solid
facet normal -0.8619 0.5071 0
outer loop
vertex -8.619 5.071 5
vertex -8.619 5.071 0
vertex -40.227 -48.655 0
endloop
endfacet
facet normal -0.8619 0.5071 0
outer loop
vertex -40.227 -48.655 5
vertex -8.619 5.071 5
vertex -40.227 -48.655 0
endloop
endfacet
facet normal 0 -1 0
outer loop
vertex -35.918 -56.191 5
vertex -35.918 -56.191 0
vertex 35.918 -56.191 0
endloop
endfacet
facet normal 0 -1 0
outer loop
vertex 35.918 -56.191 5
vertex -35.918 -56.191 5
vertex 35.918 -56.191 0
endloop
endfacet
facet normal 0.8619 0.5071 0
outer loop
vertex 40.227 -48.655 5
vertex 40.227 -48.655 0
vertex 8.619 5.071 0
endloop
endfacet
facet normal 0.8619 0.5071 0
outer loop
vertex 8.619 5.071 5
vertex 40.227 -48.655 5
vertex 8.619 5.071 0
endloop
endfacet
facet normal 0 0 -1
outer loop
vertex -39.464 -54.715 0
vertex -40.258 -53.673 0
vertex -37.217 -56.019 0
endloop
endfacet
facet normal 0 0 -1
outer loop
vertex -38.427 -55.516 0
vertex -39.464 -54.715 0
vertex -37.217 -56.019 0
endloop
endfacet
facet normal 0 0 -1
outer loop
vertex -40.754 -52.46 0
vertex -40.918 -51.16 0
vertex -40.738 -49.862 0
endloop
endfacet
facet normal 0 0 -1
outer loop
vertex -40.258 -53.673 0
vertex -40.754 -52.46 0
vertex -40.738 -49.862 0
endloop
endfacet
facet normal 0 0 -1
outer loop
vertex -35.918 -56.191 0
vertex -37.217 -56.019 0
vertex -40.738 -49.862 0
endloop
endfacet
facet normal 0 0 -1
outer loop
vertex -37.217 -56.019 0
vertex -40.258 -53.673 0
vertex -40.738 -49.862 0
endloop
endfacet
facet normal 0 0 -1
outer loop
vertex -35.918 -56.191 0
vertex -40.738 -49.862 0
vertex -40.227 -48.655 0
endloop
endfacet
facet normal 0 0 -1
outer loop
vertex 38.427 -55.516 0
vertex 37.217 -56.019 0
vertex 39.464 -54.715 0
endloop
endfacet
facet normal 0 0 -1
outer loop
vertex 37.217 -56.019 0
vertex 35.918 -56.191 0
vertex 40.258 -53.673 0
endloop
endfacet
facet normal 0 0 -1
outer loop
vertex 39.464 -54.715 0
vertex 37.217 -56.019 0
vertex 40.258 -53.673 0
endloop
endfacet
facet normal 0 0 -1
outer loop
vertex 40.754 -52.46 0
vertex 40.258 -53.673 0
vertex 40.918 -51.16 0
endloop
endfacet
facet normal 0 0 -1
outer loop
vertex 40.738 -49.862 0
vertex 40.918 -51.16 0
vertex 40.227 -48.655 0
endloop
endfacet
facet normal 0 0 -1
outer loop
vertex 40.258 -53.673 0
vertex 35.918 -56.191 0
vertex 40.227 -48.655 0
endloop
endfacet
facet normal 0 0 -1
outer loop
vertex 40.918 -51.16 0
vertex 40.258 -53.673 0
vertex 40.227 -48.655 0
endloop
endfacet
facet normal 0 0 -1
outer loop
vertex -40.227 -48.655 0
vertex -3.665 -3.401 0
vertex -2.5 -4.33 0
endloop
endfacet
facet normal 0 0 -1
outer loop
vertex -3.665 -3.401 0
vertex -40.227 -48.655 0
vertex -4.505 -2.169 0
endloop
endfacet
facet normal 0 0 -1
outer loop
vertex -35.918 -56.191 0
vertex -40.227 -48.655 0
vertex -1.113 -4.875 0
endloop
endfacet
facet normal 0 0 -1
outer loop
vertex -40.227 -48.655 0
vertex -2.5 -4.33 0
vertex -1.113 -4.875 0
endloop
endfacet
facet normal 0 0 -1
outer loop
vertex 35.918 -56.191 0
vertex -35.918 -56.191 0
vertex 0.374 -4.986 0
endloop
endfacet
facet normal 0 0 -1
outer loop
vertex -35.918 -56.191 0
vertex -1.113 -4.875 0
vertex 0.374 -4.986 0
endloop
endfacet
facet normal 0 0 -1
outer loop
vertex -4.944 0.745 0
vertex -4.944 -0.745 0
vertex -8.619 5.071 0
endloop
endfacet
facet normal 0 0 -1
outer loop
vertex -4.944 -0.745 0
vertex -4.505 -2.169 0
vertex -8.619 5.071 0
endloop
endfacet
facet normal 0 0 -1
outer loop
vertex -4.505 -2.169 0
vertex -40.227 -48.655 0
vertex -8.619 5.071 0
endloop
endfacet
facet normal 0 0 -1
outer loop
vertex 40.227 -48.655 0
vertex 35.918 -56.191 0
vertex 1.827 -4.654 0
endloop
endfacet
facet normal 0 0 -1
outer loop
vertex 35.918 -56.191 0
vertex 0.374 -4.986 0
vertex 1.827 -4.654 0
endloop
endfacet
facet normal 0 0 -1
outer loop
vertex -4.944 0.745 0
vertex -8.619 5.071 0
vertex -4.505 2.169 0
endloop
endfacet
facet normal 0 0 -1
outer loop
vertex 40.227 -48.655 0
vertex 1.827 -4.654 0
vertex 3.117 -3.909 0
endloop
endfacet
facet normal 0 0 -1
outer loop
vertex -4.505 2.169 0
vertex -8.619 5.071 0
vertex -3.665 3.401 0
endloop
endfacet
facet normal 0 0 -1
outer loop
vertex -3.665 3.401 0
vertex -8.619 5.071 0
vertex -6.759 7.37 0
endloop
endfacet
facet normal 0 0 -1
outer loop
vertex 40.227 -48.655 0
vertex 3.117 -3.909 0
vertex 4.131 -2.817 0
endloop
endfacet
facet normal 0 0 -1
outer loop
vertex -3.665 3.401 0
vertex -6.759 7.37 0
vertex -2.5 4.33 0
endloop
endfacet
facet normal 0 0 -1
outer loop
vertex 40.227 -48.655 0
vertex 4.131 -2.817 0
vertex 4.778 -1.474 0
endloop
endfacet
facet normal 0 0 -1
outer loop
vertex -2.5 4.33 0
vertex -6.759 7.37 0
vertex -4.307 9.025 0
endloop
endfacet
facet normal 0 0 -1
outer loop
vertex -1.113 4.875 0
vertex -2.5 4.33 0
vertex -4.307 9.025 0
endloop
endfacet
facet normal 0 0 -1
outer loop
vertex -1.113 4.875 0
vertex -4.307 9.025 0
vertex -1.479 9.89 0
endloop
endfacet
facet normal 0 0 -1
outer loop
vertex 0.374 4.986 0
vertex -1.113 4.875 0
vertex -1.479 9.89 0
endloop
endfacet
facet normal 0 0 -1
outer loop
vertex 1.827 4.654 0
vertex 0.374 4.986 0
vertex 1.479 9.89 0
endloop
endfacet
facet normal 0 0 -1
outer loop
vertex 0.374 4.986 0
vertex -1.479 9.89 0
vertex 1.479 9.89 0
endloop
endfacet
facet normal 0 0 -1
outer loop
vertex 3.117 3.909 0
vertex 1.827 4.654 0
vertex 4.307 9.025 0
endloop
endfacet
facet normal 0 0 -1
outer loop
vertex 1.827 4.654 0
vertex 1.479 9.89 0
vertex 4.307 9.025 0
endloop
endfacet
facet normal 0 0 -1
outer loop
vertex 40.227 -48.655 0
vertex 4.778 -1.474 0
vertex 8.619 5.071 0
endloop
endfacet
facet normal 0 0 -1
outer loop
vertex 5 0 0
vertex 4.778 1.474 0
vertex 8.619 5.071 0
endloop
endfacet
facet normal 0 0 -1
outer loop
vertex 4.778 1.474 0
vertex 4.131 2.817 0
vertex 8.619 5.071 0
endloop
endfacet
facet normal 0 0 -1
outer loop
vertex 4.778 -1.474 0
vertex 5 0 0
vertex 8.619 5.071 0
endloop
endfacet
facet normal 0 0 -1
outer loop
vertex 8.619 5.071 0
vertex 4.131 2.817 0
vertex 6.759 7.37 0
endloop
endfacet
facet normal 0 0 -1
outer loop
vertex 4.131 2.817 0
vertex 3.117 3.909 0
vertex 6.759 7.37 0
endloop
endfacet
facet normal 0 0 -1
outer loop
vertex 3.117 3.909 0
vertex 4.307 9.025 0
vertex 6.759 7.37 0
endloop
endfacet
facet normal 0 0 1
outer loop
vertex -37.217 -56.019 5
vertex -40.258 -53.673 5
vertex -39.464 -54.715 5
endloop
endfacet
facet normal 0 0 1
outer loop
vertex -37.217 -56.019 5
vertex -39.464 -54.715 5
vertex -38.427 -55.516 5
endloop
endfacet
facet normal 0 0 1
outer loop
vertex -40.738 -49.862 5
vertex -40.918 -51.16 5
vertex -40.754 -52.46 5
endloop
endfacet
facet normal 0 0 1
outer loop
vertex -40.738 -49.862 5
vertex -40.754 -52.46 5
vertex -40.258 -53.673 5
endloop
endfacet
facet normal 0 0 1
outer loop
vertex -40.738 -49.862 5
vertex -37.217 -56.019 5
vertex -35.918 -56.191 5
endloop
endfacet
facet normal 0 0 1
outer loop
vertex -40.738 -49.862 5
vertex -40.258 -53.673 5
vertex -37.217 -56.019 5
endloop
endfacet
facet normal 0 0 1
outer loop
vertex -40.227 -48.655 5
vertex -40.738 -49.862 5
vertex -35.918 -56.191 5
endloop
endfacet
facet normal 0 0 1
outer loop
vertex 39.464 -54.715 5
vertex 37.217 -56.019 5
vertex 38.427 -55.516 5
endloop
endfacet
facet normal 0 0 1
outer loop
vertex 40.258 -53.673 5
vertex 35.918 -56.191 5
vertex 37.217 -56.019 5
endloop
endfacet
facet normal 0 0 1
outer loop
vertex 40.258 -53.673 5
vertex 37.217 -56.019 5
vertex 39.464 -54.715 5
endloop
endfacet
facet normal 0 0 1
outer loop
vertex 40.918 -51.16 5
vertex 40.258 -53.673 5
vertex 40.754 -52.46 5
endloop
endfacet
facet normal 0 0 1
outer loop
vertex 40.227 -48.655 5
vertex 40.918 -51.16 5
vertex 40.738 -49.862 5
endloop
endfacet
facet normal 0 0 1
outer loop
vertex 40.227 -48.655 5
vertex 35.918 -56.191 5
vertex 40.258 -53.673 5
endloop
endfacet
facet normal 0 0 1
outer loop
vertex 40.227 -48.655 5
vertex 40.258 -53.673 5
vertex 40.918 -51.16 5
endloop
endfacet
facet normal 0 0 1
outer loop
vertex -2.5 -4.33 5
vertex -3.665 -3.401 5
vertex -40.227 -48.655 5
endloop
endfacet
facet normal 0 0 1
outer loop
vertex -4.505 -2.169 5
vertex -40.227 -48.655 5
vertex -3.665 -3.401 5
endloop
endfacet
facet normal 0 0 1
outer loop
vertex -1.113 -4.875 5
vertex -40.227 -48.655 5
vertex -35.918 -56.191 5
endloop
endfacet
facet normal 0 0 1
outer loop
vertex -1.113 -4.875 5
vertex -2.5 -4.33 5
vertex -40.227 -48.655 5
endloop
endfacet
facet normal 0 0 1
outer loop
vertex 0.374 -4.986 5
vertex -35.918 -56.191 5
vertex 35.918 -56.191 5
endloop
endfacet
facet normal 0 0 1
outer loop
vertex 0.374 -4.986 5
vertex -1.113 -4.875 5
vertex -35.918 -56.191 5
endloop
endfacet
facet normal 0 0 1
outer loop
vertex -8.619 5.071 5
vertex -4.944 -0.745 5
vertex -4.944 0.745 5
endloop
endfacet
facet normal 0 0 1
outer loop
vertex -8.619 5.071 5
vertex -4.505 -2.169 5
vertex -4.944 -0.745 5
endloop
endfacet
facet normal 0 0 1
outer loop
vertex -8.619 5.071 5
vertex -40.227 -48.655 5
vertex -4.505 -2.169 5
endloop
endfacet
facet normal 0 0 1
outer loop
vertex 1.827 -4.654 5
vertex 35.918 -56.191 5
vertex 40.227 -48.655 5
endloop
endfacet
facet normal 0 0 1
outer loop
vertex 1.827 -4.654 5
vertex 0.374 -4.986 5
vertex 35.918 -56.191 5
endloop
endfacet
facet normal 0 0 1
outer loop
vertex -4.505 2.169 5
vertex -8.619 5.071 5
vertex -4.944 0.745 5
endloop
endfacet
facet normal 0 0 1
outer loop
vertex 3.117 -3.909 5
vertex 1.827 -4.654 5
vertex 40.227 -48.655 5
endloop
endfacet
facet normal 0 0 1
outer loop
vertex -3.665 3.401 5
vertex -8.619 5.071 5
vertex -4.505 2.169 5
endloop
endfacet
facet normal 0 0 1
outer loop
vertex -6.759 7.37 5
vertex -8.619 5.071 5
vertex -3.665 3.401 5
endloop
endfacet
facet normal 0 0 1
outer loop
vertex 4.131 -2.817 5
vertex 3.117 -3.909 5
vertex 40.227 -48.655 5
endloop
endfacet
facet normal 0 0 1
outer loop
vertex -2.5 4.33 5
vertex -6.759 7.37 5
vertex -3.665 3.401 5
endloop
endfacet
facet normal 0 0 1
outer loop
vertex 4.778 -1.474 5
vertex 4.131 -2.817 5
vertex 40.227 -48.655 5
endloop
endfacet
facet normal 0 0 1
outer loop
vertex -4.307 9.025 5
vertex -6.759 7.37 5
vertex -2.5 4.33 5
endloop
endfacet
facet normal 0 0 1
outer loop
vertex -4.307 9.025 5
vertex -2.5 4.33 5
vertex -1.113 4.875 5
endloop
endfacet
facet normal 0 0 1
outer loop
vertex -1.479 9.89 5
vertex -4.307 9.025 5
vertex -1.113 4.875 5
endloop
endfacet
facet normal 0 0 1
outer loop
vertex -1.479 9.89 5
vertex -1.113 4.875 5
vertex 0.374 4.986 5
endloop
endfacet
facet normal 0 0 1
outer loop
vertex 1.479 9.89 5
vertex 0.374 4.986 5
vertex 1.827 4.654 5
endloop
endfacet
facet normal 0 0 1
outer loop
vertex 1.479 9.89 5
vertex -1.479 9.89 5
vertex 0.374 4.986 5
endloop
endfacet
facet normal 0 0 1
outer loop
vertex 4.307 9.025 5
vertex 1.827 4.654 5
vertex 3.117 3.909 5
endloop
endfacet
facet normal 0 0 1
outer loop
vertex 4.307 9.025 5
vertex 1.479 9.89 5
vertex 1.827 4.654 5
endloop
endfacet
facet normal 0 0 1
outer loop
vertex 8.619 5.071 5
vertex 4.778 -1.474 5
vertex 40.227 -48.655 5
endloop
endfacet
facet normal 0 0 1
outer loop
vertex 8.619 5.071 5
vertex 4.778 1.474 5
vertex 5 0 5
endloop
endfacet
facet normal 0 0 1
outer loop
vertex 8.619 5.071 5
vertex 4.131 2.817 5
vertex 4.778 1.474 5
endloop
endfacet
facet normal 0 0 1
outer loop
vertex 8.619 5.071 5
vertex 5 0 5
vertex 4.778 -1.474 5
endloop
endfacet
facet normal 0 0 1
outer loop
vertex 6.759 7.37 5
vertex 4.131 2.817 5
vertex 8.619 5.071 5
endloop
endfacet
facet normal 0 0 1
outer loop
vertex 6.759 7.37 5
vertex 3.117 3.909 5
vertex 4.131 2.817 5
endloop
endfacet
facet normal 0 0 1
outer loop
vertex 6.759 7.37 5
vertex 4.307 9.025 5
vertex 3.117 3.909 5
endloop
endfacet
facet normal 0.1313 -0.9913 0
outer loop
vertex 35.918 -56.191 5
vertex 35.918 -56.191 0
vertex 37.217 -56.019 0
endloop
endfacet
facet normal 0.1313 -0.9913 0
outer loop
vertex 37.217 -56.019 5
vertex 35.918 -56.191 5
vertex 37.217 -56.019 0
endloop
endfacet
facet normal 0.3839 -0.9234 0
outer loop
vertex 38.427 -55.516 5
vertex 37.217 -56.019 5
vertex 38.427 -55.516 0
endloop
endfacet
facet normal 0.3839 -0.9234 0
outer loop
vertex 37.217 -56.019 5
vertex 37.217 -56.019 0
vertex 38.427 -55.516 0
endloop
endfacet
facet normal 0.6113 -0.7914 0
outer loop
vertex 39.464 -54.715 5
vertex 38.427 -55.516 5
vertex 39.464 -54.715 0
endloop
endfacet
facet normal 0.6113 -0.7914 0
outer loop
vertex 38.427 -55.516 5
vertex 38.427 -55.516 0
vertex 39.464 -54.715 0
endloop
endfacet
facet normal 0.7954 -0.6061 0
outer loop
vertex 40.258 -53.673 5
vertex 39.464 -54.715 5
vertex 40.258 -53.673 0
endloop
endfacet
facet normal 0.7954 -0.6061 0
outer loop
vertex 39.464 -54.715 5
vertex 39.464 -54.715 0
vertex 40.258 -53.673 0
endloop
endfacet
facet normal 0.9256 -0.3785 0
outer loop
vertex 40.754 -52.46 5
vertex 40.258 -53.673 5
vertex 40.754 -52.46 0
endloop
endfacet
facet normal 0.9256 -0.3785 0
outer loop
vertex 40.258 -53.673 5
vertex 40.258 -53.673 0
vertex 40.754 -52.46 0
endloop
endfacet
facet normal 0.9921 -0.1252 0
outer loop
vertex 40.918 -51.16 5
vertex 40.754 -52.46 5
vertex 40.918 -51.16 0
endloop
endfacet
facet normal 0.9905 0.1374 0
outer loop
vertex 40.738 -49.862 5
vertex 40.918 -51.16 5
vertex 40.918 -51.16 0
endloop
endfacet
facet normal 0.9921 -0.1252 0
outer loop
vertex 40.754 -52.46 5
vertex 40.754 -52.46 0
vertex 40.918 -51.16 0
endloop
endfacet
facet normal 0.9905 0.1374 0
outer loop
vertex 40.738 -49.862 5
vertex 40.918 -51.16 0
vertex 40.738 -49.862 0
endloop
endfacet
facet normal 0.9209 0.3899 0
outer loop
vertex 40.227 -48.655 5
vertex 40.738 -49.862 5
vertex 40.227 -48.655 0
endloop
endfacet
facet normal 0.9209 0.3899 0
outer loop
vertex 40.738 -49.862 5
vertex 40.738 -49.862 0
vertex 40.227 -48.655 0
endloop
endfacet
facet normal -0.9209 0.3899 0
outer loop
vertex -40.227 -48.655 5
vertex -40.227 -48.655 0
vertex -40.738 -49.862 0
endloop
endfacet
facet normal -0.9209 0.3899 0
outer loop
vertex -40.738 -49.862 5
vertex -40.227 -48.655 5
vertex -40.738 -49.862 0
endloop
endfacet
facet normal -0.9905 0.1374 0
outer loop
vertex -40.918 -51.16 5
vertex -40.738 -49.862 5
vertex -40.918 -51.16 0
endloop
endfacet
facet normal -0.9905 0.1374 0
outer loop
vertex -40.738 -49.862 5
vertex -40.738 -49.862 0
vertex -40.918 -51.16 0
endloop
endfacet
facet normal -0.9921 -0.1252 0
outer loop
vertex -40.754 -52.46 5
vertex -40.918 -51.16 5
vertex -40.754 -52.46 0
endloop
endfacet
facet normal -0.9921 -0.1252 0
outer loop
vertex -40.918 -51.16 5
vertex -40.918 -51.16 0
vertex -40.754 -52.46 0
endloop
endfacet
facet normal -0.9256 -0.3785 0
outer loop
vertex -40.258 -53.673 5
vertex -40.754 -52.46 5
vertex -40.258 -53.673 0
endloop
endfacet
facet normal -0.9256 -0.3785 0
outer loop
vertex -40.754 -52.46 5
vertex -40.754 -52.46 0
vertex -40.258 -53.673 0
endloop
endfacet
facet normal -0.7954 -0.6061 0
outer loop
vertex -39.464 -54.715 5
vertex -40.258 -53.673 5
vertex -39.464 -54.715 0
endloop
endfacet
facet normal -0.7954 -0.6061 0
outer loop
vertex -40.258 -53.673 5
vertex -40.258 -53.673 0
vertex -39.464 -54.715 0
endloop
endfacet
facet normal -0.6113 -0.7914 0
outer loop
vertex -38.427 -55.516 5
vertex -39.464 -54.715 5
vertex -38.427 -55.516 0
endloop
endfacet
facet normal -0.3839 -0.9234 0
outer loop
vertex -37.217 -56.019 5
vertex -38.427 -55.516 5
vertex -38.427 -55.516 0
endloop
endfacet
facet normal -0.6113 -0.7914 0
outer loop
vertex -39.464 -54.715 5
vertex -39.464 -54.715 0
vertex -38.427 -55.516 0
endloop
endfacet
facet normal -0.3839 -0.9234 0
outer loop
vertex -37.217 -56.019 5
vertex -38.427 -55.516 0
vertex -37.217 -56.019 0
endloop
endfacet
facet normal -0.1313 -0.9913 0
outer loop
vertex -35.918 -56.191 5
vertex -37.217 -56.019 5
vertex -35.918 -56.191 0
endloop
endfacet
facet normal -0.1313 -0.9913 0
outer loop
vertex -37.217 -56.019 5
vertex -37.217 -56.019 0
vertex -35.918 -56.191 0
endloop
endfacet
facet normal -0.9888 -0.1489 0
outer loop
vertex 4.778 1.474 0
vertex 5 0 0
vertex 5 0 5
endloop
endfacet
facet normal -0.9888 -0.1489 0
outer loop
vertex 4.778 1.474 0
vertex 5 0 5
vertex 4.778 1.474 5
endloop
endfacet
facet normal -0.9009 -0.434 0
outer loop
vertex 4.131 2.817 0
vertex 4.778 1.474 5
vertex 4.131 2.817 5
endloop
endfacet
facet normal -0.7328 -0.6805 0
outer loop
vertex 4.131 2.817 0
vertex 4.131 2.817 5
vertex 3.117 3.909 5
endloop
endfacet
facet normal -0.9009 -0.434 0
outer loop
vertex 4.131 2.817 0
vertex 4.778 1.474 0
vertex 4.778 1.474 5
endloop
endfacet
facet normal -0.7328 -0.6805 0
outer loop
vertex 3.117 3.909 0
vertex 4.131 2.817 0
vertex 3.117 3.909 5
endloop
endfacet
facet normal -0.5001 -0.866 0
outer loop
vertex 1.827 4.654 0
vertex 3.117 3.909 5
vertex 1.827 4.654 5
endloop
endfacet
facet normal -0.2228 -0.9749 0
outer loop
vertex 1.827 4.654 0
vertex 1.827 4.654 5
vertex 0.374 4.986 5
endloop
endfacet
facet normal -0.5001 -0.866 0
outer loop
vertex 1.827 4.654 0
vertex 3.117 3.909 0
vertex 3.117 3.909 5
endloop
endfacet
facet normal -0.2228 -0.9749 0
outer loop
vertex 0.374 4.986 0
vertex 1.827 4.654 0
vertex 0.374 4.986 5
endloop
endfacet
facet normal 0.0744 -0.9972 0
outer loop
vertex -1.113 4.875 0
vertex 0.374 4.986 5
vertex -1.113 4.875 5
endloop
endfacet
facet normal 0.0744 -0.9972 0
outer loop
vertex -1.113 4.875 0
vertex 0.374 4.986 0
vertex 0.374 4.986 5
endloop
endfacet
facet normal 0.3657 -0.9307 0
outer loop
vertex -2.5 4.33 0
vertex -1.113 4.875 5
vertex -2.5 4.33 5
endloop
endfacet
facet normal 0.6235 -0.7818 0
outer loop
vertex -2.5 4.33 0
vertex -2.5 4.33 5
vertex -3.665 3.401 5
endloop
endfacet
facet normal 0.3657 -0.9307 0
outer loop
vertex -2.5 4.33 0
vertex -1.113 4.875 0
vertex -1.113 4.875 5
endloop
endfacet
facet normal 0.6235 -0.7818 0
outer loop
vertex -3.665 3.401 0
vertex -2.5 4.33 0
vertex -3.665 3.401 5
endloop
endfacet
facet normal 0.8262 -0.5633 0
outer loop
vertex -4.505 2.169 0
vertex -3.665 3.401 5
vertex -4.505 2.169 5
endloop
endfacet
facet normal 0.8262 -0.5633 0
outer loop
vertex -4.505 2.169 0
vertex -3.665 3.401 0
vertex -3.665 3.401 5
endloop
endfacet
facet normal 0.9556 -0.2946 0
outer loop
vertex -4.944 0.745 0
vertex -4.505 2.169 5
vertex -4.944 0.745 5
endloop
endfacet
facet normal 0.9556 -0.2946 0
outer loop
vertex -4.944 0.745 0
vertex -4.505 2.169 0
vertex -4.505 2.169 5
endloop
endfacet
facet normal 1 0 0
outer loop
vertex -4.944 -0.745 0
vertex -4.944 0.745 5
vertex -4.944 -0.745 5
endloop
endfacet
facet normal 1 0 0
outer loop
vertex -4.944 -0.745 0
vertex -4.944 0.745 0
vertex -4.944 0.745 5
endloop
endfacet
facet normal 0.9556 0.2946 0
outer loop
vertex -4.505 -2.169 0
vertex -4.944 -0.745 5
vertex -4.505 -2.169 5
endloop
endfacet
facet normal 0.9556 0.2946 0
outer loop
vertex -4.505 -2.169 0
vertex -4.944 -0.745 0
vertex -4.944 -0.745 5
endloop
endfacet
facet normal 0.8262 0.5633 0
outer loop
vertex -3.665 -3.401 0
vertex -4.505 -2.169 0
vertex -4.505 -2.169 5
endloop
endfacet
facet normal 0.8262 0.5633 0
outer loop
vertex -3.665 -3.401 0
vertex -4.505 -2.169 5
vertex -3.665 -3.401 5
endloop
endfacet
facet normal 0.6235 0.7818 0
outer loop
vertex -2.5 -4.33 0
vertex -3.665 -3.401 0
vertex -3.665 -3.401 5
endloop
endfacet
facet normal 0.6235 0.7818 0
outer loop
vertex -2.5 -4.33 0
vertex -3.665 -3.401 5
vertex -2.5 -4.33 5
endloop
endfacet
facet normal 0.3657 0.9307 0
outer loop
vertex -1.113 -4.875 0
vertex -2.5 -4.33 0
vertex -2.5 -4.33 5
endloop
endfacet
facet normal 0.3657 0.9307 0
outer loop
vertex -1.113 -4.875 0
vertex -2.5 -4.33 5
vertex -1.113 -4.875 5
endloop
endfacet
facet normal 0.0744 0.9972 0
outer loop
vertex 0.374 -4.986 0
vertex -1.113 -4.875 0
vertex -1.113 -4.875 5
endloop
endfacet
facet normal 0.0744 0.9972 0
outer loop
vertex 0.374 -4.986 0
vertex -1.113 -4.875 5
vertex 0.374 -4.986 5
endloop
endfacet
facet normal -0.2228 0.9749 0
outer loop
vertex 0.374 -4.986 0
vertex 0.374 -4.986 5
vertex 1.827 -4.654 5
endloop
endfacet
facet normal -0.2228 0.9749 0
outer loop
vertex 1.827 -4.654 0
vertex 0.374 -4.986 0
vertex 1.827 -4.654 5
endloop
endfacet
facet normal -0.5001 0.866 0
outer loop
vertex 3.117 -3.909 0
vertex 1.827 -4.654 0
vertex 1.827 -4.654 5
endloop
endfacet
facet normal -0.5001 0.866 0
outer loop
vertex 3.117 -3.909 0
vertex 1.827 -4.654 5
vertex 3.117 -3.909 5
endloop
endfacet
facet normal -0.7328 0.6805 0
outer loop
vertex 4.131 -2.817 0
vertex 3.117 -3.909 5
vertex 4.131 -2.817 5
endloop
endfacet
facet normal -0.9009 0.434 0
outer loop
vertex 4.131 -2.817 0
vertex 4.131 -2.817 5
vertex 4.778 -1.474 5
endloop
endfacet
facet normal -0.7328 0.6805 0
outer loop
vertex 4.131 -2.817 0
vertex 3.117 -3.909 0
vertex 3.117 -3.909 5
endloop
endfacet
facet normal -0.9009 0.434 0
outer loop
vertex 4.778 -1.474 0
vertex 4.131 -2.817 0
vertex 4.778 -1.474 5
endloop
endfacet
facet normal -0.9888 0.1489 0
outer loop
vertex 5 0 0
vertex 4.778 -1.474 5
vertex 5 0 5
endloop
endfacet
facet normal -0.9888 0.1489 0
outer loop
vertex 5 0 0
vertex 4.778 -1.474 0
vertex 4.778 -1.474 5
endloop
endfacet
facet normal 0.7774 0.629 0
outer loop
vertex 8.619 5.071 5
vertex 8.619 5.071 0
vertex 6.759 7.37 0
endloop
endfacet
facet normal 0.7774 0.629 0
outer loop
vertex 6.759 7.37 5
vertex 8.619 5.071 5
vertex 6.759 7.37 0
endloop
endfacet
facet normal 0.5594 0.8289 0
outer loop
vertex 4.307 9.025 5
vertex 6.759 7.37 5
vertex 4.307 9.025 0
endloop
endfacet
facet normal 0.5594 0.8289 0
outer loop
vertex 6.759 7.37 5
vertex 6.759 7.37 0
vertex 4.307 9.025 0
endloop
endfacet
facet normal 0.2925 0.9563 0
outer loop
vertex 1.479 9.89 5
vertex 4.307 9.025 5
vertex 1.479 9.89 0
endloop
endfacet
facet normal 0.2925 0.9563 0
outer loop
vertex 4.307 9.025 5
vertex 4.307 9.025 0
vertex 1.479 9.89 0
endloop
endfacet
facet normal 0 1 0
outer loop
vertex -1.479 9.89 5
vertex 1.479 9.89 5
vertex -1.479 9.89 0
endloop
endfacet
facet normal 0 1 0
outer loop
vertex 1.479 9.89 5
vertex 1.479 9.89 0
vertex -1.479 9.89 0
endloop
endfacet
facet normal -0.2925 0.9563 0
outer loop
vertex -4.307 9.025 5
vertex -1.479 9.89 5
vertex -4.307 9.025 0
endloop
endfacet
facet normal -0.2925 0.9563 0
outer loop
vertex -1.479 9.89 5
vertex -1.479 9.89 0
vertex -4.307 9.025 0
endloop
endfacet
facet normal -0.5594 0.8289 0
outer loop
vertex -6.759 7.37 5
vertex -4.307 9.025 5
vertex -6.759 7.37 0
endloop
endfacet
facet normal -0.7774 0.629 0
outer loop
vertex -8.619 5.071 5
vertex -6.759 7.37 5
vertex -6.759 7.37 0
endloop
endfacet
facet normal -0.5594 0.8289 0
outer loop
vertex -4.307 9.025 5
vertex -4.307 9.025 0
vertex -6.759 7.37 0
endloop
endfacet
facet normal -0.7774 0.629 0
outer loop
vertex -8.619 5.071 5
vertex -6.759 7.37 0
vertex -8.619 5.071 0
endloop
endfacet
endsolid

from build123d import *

# Parameters (mm, degrees)
F0_R     = 5
F1_DEPTH = 5


with BuildPart() as f1:
    # F0 (on Top) → F1 (new body)
    with BuildSketch(Plane.XY):
        with BuildLine():
            Line((-35.91768, -56.190782), (0, -56.190782))
            Line((0, -56.190782), (35.91768, -56.190782))
            ThreePointArc((35.91768, -56.190782), (40.258006, -53.673033), (40.227191, -48.65541))
            Line((40.227191, -48.65541), (8.619023, 5.070743))
            ThreePointArc((8.619023, 5.070743), (0, 10), (-8.619023, 5.070743))
            Line((-8.619023, 5.070743), (-40.227191, -48.65541))
            ThreePointArc((-40.227191, -48.65541), (-40.258006, -53.673033), (-35.91768, -56.190782))
        make_face()
        Circle(F0_R, mode=Mode.SUBTRACT)
    extrude(amount=F1_DEPTH)


solid = f1.part
